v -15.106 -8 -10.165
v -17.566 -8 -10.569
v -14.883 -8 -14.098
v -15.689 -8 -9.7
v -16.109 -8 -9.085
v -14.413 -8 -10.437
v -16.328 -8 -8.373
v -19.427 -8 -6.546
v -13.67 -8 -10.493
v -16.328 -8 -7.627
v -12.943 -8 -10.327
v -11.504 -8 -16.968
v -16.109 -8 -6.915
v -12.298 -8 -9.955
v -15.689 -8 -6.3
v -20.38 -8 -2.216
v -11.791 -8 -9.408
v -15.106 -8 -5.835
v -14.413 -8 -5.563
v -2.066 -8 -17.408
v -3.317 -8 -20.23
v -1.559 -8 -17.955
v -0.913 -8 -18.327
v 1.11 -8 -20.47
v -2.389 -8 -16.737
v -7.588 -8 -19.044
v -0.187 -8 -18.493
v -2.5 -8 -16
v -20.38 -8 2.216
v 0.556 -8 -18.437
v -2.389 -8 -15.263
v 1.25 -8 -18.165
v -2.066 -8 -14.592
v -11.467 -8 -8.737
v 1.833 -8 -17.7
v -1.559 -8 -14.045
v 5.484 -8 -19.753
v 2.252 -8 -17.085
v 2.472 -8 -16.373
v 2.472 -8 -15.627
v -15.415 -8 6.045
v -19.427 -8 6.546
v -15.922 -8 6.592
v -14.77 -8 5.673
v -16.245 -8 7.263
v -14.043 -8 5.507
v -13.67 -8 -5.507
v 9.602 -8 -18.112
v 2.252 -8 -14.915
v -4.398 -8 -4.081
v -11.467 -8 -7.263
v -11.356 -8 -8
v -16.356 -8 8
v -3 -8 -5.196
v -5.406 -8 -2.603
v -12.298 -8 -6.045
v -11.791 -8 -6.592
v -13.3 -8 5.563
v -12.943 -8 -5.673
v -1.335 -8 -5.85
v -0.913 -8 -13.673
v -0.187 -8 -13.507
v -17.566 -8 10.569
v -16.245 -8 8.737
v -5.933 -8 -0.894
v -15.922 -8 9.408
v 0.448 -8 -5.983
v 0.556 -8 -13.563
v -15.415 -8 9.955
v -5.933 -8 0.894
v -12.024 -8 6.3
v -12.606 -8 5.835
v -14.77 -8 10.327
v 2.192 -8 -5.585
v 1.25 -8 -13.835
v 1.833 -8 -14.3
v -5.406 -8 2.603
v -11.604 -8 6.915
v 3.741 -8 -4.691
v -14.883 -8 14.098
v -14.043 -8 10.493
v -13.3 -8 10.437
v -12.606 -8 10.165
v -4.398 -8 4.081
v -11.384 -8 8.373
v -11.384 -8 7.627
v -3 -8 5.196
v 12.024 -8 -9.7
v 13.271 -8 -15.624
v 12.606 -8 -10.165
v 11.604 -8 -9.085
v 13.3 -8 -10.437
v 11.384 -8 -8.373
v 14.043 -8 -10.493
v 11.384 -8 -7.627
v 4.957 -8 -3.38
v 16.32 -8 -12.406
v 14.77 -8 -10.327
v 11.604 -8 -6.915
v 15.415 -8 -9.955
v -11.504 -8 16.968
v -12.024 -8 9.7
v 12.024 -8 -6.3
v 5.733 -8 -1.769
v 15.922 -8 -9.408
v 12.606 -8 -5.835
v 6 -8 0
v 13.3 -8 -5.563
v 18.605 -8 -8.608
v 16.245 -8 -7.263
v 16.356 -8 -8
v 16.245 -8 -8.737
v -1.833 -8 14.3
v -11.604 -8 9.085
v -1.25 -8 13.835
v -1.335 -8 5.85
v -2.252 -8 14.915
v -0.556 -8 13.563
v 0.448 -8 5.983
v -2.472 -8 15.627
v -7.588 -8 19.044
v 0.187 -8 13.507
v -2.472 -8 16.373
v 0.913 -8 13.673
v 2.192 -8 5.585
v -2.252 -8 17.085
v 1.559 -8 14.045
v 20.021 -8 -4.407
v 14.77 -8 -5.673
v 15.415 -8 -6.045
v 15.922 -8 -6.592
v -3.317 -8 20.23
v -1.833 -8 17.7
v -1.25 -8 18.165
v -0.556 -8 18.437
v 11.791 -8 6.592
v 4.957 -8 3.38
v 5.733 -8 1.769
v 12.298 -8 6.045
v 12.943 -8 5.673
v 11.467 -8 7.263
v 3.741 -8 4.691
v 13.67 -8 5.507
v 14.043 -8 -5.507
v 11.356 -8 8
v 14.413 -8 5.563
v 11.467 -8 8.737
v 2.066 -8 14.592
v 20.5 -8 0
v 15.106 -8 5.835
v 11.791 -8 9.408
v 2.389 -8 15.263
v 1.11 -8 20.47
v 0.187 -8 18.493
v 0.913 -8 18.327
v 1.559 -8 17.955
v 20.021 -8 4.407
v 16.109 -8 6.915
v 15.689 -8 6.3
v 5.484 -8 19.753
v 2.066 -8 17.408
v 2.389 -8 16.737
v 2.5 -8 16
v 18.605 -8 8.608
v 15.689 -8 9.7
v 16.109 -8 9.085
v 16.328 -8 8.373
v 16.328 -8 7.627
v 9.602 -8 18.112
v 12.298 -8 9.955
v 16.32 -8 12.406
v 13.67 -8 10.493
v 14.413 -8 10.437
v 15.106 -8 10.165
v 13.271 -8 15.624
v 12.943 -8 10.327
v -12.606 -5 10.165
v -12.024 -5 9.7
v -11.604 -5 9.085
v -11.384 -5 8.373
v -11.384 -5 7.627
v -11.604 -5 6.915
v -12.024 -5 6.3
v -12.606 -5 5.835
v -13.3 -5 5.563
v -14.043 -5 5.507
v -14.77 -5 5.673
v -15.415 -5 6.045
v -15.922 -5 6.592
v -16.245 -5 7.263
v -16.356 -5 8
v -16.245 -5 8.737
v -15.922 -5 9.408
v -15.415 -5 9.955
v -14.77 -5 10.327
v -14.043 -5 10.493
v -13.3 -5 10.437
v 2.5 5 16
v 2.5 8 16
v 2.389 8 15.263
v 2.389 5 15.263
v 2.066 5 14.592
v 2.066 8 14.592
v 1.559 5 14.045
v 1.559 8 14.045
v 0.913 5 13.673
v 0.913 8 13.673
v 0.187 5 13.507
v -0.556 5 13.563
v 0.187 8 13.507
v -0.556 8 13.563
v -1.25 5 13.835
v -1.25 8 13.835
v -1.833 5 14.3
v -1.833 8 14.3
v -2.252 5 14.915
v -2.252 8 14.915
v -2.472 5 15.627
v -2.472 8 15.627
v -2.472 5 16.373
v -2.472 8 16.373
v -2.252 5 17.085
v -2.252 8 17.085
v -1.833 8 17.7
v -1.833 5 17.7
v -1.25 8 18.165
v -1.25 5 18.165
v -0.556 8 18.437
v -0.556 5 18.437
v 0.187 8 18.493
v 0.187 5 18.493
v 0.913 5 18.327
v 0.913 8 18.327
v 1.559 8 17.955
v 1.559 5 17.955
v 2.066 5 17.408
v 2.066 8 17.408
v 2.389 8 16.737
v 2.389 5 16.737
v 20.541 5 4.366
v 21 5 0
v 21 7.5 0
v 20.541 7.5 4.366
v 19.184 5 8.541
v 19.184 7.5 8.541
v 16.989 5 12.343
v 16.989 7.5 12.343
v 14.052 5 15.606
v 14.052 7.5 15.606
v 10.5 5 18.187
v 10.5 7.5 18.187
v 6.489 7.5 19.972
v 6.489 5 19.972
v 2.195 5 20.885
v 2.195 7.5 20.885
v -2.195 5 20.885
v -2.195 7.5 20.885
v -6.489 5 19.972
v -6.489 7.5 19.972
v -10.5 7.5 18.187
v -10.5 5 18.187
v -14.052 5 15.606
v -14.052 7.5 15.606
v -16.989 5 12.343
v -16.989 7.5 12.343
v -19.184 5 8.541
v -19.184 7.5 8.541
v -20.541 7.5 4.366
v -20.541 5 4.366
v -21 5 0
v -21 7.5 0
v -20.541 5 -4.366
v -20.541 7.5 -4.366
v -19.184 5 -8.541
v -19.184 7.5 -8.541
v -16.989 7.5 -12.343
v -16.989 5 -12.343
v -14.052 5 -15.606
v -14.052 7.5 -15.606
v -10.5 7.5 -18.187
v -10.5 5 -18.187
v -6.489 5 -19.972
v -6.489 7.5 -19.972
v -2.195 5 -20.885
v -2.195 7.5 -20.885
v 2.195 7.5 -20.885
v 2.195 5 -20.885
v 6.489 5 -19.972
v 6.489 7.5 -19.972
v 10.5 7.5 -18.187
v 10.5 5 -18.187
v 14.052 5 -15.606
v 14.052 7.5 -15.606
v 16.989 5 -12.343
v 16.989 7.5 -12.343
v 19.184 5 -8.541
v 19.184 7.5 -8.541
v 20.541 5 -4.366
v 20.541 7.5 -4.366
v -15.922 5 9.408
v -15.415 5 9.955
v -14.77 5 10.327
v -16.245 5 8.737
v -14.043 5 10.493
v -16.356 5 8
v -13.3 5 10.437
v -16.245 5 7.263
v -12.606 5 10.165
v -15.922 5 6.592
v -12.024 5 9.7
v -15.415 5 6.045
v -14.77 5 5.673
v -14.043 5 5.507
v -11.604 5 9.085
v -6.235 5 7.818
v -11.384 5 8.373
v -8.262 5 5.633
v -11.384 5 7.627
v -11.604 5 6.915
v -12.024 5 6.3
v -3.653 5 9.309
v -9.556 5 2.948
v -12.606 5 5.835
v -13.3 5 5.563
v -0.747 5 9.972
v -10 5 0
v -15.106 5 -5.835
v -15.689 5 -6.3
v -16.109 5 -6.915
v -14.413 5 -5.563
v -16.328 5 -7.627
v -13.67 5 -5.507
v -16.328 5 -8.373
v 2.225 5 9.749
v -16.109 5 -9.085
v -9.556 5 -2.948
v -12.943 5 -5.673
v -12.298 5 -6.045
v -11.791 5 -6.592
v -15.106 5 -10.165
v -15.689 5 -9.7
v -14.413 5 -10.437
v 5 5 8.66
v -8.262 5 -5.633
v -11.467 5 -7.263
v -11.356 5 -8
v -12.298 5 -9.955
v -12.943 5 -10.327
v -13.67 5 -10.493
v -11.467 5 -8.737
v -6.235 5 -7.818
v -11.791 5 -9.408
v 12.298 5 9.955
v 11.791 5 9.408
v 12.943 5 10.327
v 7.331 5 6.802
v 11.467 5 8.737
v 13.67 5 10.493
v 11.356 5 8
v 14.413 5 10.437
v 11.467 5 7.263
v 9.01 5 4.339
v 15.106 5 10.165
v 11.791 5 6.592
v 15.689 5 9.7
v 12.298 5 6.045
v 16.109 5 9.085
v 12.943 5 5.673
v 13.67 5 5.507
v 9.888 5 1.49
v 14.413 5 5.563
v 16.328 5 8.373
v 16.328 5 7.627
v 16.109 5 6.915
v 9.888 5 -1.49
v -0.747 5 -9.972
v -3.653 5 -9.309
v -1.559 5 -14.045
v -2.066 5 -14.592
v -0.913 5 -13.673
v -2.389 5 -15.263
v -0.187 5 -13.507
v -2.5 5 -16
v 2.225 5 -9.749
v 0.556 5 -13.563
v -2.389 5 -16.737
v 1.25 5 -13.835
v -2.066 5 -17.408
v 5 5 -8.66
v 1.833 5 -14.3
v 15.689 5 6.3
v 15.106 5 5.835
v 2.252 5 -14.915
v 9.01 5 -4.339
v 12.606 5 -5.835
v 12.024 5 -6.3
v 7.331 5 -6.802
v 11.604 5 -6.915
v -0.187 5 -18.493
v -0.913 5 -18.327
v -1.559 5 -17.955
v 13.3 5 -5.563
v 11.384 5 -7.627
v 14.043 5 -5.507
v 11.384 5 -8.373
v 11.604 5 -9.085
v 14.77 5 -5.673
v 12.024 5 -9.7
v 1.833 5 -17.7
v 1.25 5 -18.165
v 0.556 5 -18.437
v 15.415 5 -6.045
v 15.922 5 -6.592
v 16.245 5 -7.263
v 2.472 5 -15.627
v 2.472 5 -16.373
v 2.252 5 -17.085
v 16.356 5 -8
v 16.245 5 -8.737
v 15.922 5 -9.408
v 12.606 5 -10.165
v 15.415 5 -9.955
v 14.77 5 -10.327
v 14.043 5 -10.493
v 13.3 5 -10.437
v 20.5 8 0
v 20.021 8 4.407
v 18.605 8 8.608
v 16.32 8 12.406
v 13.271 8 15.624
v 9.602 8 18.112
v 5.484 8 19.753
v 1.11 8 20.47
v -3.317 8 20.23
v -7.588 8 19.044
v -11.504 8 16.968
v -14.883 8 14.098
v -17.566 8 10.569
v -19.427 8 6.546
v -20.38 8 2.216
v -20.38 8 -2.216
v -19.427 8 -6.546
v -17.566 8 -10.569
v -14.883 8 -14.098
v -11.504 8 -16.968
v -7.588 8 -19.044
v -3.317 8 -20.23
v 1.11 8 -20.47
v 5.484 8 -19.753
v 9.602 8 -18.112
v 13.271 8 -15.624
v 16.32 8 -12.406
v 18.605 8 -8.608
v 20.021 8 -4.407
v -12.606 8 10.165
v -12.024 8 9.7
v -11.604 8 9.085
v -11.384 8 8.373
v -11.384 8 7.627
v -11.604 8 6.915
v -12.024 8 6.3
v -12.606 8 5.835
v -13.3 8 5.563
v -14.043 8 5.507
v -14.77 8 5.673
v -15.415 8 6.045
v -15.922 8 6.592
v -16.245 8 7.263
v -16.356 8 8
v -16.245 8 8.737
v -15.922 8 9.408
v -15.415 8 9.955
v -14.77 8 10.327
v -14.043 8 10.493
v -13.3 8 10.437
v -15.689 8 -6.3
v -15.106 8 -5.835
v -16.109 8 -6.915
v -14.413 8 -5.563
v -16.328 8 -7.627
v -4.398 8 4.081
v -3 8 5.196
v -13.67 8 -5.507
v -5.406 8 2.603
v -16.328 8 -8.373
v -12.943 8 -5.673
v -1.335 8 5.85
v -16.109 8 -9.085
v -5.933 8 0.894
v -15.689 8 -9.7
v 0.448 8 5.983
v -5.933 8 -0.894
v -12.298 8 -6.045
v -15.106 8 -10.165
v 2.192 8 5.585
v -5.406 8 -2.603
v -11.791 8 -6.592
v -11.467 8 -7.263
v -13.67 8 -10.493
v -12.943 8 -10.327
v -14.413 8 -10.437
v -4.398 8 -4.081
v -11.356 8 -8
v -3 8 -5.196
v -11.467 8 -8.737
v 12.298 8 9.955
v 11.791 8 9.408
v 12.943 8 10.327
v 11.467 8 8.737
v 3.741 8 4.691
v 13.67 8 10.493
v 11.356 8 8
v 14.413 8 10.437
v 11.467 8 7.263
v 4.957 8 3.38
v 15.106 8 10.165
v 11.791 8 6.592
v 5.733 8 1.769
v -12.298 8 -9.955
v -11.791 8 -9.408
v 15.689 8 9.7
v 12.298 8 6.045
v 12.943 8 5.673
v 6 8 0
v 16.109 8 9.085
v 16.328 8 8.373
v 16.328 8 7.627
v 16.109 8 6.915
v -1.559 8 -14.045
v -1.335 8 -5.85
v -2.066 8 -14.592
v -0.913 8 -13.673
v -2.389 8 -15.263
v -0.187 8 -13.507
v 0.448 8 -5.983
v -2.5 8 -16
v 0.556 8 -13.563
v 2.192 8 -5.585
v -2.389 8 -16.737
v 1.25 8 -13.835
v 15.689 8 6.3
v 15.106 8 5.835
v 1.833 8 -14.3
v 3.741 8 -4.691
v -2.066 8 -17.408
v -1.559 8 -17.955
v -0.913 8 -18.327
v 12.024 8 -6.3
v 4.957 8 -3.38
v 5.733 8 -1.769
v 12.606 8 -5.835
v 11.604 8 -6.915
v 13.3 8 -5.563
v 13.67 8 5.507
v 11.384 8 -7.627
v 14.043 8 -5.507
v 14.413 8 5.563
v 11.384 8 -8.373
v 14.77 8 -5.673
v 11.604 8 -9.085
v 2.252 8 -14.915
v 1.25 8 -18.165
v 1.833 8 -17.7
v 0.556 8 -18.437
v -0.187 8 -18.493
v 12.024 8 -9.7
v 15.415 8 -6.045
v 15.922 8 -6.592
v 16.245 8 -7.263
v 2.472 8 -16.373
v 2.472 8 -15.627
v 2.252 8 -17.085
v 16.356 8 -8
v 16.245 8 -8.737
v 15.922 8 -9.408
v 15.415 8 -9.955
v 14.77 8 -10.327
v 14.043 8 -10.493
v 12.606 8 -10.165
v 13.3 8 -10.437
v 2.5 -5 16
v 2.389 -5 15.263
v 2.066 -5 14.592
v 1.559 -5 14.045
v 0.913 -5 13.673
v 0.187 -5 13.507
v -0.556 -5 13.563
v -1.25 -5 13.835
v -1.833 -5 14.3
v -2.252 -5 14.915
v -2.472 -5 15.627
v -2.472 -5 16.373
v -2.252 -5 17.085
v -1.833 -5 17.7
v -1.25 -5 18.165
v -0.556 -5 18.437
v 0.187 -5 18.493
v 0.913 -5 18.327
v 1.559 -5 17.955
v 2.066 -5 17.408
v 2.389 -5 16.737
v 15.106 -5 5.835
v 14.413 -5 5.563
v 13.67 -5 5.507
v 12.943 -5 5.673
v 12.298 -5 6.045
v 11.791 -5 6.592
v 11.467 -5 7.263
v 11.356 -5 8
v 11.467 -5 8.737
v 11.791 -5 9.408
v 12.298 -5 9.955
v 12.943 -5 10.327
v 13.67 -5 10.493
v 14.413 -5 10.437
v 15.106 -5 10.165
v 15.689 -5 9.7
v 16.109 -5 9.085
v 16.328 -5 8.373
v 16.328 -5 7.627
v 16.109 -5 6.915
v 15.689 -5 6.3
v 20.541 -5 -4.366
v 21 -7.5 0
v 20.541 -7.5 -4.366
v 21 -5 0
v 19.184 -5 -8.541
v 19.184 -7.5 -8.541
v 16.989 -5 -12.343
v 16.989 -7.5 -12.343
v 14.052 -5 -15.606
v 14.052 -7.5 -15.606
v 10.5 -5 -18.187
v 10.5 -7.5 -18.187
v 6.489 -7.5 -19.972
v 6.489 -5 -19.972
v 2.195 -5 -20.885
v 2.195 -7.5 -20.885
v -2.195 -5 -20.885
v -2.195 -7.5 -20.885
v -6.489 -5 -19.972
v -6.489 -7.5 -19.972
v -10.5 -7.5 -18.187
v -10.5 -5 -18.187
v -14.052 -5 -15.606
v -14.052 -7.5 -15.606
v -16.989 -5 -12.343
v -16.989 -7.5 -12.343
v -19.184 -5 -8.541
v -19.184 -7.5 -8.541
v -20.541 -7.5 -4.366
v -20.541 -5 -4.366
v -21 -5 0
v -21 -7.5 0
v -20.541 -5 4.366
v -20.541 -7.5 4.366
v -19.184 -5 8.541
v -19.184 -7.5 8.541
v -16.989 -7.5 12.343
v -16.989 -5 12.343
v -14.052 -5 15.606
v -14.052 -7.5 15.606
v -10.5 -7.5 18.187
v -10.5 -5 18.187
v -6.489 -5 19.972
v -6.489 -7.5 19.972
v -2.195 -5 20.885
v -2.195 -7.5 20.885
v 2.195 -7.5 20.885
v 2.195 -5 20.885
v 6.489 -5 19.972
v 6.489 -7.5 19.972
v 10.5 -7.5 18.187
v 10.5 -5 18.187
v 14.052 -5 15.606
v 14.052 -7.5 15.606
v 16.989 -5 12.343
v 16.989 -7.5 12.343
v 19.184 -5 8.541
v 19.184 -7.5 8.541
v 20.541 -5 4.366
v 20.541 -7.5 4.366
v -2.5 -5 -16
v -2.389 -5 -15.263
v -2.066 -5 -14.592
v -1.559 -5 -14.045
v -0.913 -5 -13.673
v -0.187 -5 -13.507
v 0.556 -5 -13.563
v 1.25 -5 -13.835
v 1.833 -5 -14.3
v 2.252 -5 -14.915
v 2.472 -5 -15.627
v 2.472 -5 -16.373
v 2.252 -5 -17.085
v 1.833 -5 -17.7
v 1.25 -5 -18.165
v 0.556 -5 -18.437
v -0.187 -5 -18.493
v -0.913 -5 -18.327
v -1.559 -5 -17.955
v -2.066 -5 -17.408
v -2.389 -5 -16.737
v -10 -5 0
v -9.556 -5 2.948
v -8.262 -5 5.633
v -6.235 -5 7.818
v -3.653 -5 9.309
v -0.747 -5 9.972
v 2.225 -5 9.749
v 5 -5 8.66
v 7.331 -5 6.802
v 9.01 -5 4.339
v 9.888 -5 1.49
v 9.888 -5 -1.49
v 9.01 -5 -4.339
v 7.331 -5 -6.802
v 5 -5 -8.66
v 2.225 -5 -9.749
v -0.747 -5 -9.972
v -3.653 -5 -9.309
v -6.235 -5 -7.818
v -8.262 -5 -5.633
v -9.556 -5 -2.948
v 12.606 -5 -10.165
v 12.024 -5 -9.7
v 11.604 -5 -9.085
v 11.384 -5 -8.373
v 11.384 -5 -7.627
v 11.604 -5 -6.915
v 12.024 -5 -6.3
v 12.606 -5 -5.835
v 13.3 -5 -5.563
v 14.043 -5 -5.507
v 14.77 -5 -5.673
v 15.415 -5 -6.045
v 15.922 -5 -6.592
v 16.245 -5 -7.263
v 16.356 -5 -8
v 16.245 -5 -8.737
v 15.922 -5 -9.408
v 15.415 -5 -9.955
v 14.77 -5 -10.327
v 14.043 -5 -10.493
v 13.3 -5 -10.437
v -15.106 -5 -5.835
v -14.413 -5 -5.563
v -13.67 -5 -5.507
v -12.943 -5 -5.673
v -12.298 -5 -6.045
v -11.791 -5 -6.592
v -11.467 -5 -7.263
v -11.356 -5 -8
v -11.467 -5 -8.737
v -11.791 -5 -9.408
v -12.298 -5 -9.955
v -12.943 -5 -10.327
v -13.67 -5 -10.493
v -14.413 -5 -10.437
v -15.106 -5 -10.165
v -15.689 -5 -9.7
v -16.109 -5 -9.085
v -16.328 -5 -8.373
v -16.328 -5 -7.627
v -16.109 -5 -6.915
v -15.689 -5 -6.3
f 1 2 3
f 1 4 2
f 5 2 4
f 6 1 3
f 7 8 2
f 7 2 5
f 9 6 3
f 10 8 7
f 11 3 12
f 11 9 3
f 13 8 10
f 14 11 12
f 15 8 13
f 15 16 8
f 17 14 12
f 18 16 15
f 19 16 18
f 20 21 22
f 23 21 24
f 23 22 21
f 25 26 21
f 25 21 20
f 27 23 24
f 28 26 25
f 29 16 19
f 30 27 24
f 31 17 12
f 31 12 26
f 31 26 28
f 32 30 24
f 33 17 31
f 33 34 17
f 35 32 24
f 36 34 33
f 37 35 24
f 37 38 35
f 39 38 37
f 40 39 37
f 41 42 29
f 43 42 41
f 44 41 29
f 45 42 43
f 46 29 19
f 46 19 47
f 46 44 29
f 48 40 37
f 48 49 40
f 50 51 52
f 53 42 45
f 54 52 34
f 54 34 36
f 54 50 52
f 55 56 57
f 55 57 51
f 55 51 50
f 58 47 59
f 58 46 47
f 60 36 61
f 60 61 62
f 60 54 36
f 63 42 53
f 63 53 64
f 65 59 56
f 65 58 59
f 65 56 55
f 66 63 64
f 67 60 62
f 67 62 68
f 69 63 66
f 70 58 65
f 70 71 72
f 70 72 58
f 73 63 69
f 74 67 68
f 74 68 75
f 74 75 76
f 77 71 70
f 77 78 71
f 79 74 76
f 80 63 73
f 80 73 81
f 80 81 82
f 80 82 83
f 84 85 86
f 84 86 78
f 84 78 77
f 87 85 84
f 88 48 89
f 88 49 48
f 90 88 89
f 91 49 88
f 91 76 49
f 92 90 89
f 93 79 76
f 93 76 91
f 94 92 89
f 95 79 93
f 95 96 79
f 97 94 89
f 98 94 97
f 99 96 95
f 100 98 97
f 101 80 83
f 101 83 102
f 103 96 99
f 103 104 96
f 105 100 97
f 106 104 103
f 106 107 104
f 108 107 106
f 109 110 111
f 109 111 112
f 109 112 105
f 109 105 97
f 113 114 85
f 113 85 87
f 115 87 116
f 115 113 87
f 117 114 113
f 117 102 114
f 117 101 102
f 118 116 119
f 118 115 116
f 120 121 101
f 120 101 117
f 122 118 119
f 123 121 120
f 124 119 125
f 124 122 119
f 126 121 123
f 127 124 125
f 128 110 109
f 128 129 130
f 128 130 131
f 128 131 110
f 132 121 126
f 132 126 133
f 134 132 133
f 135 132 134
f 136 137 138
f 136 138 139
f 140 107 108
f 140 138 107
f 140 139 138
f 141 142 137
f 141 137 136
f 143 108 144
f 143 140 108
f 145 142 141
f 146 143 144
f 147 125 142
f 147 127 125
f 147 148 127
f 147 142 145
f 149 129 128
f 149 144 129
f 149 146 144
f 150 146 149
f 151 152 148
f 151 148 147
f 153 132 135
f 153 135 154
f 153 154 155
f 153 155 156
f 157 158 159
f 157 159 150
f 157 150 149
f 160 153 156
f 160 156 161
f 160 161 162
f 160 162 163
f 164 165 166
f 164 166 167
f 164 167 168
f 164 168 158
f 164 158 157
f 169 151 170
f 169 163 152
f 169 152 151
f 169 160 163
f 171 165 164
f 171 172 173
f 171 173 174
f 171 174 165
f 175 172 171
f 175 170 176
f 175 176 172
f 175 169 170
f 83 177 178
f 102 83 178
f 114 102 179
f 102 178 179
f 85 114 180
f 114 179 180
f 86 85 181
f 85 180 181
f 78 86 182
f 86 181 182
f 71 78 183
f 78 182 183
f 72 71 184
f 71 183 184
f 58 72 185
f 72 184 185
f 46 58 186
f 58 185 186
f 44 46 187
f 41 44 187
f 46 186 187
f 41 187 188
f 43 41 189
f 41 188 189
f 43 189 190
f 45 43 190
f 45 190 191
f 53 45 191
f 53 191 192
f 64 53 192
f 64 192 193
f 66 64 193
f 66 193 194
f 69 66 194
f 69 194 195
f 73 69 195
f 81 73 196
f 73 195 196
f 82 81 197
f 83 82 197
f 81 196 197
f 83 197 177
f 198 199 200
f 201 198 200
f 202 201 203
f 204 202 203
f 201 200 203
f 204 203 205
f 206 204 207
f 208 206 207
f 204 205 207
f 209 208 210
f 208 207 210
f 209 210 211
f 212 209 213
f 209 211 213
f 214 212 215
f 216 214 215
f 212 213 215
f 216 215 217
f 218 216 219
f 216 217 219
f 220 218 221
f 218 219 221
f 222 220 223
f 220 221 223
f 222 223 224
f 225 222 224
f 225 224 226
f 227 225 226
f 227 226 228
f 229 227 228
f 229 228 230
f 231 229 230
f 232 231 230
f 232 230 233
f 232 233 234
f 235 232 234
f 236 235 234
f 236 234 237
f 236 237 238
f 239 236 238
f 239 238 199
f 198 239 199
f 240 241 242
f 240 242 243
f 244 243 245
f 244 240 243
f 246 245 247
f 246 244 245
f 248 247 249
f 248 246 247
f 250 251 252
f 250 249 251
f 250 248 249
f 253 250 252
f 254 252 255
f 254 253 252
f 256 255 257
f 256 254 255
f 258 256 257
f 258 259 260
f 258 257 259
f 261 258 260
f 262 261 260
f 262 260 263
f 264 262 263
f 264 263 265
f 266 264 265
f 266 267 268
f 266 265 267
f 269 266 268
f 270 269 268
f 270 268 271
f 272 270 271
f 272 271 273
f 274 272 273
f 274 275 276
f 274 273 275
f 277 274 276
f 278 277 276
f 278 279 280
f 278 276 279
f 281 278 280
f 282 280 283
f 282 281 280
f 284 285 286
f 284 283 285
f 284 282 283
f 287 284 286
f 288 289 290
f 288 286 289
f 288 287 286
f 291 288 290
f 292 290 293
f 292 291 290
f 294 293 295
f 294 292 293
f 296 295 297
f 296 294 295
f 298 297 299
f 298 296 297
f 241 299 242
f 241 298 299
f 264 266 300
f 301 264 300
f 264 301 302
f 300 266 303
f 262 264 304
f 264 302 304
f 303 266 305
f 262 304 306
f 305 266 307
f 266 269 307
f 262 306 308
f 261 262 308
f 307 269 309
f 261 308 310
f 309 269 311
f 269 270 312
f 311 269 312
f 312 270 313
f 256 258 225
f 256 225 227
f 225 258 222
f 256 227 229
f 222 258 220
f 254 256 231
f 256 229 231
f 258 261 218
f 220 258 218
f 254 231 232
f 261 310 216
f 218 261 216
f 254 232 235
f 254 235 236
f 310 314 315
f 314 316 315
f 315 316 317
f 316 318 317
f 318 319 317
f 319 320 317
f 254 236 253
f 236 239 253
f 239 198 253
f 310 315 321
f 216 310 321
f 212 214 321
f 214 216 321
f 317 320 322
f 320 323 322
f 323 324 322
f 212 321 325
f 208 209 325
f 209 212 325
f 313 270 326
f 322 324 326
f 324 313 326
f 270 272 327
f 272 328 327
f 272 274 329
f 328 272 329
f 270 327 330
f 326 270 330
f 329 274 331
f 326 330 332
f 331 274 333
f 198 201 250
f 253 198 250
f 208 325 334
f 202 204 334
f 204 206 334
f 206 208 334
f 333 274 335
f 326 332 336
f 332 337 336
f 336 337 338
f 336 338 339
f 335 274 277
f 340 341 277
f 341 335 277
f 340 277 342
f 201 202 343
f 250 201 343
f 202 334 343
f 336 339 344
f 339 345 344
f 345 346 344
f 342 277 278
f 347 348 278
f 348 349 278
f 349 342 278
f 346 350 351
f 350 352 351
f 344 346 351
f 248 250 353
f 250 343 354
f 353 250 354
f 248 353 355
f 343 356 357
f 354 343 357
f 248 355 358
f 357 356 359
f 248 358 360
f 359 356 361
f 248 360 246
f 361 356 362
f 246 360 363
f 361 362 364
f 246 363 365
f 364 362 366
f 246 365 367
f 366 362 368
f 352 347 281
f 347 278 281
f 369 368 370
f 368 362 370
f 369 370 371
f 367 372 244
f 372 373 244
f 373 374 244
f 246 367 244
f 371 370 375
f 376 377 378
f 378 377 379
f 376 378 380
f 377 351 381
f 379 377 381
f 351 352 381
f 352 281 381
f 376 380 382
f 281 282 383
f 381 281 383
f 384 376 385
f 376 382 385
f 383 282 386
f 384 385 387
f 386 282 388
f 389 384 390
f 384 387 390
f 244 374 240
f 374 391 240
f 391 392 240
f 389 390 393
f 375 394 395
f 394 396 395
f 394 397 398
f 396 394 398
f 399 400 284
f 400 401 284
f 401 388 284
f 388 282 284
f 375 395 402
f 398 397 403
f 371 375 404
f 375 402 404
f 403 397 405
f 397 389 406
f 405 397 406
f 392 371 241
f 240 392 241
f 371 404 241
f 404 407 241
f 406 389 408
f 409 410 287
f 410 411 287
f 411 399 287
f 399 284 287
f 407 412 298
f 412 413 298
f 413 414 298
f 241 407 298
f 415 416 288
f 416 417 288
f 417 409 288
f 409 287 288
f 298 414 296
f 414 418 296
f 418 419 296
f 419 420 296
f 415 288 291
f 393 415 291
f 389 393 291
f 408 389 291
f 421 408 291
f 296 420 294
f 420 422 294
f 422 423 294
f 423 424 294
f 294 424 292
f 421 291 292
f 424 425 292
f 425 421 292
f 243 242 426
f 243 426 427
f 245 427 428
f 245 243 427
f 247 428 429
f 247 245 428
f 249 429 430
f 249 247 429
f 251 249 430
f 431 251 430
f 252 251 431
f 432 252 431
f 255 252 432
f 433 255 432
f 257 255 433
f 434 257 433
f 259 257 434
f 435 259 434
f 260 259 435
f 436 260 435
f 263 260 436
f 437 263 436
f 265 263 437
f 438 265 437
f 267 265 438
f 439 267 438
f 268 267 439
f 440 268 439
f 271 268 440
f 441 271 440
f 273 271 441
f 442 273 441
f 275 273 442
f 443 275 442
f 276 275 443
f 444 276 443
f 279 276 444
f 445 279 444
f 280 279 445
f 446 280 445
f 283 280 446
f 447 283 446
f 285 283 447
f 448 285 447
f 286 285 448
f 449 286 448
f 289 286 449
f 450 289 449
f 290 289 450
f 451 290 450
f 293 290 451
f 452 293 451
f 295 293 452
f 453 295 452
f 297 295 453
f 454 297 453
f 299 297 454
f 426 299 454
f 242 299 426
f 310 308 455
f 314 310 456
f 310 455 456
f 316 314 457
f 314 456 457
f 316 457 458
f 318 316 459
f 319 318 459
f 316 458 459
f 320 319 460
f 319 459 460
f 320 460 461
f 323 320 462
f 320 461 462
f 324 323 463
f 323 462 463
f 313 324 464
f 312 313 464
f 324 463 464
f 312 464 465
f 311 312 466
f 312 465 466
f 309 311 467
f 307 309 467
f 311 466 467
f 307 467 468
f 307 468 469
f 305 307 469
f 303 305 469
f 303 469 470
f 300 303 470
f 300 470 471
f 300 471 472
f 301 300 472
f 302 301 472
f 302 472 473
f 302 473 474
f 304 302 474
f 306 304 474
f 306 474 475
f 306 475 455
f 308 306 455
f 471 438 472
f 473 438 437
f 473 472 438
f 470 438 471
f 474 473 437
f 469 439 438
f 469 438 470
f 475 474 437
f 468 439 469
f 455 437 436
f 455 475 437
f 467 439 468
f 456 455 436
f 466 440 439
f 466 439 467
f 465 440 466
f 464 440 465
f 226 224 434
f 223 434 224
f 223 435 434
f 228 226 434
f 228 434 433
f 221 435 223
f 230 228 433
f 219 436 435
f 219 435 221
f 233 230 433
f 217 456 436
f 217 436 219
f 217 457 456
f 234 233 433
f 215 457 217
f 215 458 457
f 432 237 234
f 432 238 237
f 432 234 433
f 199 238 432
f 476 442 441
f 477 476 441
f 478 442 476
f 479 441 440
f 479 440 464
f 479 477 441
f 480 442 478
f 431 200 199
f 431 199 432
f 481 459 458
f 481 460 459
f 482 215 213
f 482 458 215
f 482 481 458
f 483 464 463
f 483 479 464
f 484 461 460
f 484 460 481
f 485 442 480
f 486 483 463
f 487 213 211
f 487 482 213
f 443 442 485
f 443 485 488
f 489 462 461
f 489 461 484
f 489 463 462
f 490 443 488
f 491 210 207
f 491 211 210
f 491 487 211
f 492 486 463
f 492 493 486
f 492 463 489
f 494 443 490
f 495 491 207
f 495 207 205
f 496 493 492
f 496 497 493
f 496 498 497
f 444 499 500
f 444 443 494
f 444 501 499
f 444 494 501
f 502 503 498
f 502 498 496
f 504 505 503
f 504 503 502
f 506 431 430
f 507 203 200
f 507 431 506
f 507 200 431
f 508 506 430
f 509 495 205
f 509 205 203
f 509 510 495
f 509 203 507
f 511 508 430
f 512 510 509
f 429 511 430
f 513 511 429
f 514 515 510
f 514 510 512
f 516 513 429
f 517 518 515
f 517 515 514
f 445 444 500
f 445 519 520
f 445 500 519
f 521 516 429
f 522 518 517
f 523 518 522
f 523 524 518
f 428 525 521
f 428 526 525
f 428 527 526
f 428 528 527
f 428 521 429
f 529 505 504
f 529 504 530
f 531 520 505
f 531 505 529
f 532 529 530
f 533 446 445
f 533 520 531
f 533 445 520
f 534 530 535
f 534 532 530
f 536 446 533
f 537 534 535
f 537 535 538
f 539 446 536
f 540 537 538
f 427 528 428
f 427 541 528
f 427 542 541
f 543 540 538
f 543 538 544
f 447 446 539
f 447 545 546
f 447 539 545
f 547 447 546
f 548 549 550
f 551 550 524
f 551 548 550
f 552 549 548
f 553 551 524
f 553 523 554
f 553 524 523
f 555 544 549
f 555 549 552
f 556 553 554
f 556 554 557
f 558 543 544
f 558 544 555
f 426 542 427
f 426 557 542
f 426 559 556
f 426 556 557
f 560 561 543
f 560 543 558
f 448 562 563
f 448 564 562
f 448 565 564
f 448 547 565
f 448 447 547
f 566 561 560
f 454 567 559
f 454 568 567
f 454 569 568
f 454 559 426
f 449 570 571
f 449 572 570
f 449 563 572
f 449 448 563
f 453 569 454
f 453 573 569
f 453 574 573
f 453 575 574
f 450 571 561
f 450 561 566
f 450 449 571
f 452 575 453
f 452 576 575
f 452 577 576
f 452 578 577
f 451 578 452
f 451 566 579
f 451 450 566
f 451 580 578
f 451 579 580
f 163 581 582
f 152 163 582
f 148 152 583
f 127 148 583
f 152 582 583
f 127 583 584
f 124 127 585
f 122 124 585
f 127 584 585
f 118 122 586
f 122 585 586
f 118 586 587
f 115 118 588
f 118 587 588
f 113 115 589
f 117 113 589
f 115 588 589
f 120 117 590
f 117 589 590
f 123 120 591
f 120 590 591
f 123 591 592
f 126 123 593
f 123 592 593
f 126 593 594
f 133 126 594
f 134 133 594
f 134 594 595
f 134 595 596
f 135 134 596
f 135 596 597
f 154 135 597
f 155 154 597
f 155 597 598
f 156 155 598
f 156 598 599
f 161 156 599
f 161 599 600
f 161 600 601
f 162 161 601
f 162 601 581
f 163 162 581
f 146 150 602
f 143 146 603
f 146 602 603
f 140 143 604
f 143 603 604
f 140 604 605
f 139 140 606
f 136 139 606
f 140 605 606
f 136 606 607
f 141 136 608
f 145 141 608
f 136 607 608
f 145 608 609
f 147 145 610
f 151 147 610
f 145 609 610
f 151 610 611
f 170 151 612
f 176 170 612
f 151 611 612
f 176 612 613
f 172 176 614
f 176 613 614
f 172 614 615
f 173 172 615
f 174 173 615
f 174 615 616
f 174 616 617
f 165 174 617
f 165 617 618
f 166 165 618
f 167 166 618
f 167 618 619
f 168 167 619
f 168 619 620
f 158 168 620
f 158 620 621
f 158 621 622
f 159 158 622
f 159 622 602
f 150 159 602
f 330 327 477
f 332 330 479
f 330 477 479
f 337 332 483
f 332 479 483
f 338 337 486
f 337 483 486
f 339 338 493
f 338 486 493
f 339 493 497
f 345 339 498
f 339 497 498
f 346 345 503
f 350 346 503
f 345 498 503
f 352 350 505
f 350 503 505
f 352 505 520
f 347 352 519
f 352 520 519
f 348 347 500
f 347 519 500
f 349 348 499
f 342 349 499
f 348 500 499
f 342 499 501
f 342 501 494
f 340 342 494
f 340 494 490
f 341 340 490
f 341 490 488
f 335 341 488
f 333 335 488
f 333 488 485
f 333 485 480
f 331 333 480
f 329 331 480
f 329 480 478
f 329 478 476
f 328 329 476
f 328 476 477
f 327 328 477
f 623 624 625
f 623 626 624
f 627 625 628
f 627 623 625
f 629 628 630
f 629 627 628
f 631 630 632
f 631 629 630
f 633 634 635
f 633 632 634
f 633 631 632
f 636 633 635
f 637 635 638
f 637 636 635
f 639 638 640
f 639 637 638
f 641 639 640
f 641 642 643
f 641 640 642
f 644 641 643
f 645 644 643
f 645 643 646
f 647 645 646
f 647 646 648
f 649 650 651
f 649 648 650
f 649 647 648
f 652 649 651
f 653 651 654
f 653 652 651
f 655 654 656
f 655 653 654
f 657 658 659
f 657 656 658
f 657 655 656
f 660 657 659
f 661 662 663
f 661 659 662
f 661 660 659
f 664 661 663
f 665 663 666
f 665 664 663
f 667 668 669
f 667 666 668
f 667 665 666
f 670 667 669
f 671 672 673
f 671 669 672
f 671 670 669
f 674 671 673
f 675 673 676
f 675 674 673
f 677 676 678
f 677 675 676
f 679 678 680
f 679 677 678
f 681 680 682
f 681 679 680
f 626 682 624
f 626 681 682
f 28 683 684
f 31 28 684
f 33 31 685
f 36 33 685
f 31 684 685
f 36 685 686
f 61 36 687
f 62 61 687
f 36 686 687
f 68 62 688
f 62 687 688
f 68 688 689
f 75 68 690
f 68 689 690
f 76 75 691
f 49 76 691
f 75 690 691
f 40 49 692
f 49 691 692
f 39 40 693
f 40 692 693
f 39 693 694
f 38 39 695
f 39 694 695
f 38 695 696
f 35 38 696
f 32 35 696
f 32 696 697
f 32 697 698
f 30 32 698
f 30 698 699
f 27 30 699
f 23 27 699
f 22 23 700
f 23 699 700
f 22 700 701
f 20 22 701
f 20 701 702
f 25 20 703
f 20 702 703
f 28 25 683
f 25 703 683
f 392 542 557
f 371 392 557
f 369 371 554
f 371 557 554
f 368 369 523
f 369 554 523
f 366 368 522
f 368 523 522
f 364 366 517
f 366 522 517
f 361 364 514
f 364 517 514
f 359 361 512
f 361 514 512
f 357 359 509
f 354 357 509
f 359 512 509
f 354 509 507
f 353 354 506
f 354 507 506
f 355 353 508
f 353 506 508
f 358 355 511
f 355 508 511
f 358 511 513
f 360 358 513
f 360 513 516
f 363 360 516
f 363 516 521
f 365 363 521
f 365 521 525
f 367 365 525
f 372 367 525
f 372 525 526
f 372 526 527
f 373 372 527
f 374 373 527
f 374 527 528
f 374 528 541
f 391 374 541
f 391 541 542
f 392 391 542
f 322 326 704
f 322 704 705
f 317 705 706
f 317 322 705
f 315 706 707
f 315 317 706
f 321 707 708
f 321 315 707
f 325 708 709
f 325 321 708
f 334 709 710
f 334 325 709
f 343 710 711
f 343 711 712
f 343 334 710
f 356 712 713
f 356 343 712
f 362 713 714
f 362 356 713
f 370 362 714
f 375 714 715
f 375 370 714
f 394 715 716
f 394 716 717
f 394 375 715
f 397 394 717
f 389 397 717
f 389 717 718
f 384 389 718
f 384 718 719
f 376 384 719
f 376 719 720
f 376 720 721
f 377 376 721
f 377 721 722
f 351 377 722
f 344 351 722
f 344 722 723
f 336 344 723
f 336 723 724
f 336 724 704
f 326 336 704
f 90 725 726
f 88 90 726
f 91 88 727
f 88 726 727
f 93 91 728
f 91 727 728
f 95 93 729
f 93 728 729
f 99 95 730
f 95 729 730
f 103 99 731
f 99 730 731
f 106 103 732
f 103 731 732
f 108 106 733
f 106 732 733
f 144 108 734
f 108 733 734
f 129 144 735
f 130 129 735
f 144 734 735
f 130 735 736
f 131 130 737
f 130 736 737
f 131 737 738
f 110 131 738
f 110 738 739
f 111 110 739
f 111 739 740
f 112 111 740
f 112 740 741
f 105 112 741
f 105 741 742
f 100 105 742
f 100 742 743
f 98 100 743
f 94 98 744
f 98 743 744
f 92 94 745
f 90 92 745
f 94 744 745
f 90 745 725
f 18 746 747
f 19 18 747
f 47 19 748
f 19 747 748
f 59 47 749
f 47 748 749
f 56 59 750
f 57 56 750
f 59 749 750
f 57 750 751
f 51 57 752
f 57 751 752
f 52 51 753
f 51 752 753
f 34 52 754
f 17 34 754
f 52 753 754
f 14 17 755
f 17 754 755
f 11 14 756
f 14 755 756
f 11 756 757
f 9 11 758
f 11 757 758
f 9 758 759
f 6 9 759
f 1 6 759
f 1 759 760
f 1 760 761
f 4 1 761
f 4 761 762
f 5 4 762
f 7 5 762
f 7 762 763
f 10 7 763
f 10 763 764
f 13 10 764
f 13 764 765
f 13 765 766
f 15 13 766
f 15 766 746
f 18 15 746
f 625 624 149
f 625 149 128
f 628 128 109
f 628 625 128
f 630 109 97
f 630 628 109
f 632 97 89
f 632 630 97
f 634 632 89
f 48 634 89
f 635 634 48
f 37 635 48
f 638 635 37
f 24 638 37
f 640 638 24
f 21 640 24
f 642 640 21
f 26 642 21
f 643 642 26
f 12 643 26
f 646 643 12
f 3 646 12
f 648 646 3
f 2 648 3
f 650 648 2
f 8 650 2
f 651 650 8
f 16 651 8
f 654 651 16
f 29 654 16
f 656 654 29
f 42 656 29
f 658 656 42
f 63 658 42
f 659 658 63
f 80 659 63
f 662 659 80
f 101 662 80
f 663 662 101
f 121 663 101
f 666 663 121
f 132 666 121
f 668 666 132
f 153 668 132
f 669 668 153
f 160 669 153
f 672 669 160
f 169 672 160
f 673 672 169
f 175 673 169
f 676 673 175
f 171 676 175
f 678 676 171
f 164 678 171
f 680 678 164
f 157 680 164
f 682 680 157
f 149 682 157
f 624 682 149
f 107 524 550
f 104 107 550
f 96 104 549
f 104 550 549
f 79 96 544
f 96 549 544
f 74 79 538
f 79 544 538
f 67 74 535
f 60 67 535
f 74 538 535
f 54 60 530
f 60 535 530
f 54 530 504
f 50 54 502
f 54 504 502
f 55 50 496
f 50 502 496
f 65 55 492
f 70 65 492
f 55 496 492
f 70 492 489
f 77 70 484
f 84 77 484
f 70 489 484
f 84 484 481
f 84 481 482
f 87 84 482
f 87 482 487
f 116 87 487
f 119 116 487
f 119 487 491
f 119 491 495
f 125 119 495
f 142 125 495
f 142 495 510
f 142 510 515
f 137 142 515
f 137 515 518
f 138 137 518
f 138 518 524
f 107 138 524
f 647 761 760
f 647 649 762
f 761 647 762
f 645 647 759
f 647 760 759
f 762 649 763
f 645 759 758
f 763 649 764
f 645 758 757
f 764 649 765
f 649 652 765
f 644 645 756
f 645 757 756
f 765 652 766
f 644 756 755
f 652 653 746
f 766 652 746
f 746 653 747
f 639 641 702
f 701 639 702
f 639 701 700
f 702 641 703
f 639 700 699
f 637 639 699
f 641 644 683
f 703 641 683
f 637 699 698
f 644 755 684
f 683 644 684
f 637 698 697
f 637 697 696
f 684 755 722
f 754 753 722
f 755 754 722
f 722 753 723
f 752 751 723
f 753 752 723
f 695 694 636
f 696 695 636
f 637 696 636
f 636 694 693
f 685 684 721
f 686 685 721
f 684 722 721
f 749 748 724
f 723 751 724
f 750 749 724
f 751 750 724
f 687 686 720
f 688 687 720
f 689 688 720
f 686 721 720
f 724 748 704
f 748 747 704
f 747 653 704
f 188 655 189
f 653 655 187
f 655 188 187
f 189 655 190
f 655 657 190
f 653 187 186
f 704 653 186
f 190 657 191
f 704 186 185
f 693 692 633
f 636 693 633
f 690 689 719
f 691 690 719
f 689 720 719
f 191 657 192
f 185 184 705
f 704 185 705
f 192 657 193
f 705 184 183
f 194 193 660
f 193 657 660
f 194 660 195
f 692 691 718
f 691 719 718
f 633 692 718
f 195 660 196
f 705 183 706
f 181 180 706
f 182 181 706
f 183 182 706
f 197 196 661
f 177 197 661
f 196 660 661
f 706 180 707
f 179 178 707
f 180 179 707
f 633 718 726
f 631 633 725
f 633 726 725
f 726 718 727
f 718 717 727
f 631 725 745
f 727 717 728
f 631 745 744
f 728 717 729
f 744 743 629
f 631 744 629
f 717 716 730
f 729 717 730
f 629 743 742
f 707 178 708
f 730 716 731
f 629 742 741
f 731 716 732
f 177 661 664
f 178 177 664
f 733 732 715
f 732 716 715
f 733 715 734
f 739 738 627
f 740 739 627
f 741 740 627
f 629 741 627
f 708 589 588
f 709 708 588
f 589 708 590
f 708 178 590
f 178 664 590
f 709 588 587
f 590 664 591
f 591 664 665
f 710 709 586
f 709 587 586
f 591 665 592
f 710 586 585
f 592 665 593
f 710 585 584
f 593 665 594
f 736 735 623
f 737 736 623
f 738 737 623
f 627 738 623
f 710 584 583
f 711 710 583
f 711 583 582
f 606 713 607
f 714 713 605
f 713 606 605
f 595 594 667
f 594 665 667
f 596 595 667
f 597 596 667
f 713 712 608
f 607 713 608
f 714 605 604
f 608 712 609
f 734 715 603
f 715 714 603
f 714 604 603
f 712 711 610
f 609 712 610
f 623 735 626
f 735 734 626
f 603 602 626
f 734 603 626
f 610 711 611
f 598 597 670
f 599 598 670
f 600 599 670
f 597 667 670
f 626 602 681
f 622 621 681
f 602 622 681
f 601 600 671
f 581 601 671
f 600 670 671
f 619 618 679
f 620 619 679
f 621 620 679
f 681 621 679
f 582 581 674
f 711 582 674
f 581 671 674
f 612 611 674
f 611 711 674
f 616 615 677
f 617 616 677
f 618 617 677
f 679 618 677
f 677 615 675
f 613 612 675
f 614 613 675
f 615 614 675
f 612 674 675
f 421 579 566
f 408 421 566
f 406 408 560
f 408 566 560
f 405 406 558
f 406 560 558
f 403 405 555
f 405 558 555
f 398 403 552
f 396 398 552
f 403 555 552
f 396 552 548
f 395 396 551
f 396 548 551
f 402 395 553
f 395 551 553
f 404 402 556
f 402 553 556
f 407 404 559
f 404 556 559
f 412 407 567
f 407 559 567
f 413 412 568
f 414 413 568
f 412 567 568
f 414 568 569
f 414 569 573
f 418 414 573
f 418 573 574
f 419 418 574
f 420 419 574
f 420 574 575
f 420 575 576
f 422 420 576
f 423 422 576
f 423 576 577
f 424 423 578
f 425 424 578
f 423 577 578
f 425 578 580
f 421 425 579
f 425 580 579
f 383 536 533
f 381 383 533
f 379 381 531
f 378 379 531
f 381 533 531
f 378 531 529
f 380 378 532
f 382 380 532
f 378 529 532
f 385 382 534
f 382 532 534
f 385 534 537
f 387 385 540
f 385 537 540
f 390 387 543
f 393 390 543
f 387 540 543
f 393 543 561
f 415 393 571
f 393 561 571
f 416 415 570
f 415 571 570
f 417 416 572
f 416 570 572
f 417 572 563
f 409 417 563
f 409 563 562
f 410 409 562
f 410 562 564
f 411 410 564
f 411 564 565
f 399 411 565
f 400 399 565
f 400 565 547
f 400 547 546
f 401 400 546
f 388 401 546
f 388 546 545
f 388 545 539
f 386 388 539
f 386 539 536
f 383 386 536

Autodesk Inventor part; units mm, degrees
ref_plane "YZ Plane" through (0, 0, 0) normal (1, 0, 0) x (0, 1, 0)
ref_plane "XZ Plane" through (0, 0, 0) normal (0, 1, 0) x (-1, 0, 0)
ref_plane "XY Plane" through (0, 0, 0) normal (0, 0, 1) x (1, 0, 0)
sketch "Sketch1" plane through (0, 0, 0) normal (0, 1, 0) x (-1, 0, 0)
  circle A0 centre (0, 0) radius 10
  dimension "d0" = 20
extrude "Extrusion1" add sketch "Sketch1" along normal mid plane 10
sketch "Sketch2" plane through (0, 5, 0) normal (0, 1, 0) x (1, 0, 0)
  circle A0 centre (0, 0) radius 21
  dimension "d3" = 42
extrude "Extrusion2" add sketch "Sketch2" along normal blind 3
sketch "Sketch3" plane through (0, -5, 0) normal (0, -1, 0) x (1, 0, 0)
  circle A0 centre (0, 0) radius 21
  dimension "d6" = 42
extrude "Extrusion3" add sketch "Sketch3" along normal blind 3
sketch "Sketch4" plane through (0, 8, 0) normal (0, 1, 0) x (1, 0, 0)
  circle A0 centre (0, 0) radius 6
  dimension "d9" = 12
extrude "Extrusion4" cut sketch "Sketch4" against normal blind 16
sketch "Sketch7" plane through (0, 8, 0) normal (0, 1, 0) x (1, 0, 0)
  circle A0 centre (0, -16) radius 2.5
  point P0 (0, 0)
  dimension "d13" = 5
extrude "Extrusion5" cut sketch "Sketch7" against normal blind 16
pattern_circular "Circular Pattern1" count 6 over 360 about axis through (0, 5, 0) along (0, 1, 0) of "Extrusion5"
chamfer "Chamfer1" distance 0.5 distance2 0.5 1 edges at (-21, 8, 0) measured on face at (-5.5882, 8, 9.3573)
chamfer "Chamfer2" distance 0.5 distance2 0.5 1 edges at (-21, -8, 0) measured on face at (5.5882, -8, -9.3573)
properties part number "connecting rod hub"
